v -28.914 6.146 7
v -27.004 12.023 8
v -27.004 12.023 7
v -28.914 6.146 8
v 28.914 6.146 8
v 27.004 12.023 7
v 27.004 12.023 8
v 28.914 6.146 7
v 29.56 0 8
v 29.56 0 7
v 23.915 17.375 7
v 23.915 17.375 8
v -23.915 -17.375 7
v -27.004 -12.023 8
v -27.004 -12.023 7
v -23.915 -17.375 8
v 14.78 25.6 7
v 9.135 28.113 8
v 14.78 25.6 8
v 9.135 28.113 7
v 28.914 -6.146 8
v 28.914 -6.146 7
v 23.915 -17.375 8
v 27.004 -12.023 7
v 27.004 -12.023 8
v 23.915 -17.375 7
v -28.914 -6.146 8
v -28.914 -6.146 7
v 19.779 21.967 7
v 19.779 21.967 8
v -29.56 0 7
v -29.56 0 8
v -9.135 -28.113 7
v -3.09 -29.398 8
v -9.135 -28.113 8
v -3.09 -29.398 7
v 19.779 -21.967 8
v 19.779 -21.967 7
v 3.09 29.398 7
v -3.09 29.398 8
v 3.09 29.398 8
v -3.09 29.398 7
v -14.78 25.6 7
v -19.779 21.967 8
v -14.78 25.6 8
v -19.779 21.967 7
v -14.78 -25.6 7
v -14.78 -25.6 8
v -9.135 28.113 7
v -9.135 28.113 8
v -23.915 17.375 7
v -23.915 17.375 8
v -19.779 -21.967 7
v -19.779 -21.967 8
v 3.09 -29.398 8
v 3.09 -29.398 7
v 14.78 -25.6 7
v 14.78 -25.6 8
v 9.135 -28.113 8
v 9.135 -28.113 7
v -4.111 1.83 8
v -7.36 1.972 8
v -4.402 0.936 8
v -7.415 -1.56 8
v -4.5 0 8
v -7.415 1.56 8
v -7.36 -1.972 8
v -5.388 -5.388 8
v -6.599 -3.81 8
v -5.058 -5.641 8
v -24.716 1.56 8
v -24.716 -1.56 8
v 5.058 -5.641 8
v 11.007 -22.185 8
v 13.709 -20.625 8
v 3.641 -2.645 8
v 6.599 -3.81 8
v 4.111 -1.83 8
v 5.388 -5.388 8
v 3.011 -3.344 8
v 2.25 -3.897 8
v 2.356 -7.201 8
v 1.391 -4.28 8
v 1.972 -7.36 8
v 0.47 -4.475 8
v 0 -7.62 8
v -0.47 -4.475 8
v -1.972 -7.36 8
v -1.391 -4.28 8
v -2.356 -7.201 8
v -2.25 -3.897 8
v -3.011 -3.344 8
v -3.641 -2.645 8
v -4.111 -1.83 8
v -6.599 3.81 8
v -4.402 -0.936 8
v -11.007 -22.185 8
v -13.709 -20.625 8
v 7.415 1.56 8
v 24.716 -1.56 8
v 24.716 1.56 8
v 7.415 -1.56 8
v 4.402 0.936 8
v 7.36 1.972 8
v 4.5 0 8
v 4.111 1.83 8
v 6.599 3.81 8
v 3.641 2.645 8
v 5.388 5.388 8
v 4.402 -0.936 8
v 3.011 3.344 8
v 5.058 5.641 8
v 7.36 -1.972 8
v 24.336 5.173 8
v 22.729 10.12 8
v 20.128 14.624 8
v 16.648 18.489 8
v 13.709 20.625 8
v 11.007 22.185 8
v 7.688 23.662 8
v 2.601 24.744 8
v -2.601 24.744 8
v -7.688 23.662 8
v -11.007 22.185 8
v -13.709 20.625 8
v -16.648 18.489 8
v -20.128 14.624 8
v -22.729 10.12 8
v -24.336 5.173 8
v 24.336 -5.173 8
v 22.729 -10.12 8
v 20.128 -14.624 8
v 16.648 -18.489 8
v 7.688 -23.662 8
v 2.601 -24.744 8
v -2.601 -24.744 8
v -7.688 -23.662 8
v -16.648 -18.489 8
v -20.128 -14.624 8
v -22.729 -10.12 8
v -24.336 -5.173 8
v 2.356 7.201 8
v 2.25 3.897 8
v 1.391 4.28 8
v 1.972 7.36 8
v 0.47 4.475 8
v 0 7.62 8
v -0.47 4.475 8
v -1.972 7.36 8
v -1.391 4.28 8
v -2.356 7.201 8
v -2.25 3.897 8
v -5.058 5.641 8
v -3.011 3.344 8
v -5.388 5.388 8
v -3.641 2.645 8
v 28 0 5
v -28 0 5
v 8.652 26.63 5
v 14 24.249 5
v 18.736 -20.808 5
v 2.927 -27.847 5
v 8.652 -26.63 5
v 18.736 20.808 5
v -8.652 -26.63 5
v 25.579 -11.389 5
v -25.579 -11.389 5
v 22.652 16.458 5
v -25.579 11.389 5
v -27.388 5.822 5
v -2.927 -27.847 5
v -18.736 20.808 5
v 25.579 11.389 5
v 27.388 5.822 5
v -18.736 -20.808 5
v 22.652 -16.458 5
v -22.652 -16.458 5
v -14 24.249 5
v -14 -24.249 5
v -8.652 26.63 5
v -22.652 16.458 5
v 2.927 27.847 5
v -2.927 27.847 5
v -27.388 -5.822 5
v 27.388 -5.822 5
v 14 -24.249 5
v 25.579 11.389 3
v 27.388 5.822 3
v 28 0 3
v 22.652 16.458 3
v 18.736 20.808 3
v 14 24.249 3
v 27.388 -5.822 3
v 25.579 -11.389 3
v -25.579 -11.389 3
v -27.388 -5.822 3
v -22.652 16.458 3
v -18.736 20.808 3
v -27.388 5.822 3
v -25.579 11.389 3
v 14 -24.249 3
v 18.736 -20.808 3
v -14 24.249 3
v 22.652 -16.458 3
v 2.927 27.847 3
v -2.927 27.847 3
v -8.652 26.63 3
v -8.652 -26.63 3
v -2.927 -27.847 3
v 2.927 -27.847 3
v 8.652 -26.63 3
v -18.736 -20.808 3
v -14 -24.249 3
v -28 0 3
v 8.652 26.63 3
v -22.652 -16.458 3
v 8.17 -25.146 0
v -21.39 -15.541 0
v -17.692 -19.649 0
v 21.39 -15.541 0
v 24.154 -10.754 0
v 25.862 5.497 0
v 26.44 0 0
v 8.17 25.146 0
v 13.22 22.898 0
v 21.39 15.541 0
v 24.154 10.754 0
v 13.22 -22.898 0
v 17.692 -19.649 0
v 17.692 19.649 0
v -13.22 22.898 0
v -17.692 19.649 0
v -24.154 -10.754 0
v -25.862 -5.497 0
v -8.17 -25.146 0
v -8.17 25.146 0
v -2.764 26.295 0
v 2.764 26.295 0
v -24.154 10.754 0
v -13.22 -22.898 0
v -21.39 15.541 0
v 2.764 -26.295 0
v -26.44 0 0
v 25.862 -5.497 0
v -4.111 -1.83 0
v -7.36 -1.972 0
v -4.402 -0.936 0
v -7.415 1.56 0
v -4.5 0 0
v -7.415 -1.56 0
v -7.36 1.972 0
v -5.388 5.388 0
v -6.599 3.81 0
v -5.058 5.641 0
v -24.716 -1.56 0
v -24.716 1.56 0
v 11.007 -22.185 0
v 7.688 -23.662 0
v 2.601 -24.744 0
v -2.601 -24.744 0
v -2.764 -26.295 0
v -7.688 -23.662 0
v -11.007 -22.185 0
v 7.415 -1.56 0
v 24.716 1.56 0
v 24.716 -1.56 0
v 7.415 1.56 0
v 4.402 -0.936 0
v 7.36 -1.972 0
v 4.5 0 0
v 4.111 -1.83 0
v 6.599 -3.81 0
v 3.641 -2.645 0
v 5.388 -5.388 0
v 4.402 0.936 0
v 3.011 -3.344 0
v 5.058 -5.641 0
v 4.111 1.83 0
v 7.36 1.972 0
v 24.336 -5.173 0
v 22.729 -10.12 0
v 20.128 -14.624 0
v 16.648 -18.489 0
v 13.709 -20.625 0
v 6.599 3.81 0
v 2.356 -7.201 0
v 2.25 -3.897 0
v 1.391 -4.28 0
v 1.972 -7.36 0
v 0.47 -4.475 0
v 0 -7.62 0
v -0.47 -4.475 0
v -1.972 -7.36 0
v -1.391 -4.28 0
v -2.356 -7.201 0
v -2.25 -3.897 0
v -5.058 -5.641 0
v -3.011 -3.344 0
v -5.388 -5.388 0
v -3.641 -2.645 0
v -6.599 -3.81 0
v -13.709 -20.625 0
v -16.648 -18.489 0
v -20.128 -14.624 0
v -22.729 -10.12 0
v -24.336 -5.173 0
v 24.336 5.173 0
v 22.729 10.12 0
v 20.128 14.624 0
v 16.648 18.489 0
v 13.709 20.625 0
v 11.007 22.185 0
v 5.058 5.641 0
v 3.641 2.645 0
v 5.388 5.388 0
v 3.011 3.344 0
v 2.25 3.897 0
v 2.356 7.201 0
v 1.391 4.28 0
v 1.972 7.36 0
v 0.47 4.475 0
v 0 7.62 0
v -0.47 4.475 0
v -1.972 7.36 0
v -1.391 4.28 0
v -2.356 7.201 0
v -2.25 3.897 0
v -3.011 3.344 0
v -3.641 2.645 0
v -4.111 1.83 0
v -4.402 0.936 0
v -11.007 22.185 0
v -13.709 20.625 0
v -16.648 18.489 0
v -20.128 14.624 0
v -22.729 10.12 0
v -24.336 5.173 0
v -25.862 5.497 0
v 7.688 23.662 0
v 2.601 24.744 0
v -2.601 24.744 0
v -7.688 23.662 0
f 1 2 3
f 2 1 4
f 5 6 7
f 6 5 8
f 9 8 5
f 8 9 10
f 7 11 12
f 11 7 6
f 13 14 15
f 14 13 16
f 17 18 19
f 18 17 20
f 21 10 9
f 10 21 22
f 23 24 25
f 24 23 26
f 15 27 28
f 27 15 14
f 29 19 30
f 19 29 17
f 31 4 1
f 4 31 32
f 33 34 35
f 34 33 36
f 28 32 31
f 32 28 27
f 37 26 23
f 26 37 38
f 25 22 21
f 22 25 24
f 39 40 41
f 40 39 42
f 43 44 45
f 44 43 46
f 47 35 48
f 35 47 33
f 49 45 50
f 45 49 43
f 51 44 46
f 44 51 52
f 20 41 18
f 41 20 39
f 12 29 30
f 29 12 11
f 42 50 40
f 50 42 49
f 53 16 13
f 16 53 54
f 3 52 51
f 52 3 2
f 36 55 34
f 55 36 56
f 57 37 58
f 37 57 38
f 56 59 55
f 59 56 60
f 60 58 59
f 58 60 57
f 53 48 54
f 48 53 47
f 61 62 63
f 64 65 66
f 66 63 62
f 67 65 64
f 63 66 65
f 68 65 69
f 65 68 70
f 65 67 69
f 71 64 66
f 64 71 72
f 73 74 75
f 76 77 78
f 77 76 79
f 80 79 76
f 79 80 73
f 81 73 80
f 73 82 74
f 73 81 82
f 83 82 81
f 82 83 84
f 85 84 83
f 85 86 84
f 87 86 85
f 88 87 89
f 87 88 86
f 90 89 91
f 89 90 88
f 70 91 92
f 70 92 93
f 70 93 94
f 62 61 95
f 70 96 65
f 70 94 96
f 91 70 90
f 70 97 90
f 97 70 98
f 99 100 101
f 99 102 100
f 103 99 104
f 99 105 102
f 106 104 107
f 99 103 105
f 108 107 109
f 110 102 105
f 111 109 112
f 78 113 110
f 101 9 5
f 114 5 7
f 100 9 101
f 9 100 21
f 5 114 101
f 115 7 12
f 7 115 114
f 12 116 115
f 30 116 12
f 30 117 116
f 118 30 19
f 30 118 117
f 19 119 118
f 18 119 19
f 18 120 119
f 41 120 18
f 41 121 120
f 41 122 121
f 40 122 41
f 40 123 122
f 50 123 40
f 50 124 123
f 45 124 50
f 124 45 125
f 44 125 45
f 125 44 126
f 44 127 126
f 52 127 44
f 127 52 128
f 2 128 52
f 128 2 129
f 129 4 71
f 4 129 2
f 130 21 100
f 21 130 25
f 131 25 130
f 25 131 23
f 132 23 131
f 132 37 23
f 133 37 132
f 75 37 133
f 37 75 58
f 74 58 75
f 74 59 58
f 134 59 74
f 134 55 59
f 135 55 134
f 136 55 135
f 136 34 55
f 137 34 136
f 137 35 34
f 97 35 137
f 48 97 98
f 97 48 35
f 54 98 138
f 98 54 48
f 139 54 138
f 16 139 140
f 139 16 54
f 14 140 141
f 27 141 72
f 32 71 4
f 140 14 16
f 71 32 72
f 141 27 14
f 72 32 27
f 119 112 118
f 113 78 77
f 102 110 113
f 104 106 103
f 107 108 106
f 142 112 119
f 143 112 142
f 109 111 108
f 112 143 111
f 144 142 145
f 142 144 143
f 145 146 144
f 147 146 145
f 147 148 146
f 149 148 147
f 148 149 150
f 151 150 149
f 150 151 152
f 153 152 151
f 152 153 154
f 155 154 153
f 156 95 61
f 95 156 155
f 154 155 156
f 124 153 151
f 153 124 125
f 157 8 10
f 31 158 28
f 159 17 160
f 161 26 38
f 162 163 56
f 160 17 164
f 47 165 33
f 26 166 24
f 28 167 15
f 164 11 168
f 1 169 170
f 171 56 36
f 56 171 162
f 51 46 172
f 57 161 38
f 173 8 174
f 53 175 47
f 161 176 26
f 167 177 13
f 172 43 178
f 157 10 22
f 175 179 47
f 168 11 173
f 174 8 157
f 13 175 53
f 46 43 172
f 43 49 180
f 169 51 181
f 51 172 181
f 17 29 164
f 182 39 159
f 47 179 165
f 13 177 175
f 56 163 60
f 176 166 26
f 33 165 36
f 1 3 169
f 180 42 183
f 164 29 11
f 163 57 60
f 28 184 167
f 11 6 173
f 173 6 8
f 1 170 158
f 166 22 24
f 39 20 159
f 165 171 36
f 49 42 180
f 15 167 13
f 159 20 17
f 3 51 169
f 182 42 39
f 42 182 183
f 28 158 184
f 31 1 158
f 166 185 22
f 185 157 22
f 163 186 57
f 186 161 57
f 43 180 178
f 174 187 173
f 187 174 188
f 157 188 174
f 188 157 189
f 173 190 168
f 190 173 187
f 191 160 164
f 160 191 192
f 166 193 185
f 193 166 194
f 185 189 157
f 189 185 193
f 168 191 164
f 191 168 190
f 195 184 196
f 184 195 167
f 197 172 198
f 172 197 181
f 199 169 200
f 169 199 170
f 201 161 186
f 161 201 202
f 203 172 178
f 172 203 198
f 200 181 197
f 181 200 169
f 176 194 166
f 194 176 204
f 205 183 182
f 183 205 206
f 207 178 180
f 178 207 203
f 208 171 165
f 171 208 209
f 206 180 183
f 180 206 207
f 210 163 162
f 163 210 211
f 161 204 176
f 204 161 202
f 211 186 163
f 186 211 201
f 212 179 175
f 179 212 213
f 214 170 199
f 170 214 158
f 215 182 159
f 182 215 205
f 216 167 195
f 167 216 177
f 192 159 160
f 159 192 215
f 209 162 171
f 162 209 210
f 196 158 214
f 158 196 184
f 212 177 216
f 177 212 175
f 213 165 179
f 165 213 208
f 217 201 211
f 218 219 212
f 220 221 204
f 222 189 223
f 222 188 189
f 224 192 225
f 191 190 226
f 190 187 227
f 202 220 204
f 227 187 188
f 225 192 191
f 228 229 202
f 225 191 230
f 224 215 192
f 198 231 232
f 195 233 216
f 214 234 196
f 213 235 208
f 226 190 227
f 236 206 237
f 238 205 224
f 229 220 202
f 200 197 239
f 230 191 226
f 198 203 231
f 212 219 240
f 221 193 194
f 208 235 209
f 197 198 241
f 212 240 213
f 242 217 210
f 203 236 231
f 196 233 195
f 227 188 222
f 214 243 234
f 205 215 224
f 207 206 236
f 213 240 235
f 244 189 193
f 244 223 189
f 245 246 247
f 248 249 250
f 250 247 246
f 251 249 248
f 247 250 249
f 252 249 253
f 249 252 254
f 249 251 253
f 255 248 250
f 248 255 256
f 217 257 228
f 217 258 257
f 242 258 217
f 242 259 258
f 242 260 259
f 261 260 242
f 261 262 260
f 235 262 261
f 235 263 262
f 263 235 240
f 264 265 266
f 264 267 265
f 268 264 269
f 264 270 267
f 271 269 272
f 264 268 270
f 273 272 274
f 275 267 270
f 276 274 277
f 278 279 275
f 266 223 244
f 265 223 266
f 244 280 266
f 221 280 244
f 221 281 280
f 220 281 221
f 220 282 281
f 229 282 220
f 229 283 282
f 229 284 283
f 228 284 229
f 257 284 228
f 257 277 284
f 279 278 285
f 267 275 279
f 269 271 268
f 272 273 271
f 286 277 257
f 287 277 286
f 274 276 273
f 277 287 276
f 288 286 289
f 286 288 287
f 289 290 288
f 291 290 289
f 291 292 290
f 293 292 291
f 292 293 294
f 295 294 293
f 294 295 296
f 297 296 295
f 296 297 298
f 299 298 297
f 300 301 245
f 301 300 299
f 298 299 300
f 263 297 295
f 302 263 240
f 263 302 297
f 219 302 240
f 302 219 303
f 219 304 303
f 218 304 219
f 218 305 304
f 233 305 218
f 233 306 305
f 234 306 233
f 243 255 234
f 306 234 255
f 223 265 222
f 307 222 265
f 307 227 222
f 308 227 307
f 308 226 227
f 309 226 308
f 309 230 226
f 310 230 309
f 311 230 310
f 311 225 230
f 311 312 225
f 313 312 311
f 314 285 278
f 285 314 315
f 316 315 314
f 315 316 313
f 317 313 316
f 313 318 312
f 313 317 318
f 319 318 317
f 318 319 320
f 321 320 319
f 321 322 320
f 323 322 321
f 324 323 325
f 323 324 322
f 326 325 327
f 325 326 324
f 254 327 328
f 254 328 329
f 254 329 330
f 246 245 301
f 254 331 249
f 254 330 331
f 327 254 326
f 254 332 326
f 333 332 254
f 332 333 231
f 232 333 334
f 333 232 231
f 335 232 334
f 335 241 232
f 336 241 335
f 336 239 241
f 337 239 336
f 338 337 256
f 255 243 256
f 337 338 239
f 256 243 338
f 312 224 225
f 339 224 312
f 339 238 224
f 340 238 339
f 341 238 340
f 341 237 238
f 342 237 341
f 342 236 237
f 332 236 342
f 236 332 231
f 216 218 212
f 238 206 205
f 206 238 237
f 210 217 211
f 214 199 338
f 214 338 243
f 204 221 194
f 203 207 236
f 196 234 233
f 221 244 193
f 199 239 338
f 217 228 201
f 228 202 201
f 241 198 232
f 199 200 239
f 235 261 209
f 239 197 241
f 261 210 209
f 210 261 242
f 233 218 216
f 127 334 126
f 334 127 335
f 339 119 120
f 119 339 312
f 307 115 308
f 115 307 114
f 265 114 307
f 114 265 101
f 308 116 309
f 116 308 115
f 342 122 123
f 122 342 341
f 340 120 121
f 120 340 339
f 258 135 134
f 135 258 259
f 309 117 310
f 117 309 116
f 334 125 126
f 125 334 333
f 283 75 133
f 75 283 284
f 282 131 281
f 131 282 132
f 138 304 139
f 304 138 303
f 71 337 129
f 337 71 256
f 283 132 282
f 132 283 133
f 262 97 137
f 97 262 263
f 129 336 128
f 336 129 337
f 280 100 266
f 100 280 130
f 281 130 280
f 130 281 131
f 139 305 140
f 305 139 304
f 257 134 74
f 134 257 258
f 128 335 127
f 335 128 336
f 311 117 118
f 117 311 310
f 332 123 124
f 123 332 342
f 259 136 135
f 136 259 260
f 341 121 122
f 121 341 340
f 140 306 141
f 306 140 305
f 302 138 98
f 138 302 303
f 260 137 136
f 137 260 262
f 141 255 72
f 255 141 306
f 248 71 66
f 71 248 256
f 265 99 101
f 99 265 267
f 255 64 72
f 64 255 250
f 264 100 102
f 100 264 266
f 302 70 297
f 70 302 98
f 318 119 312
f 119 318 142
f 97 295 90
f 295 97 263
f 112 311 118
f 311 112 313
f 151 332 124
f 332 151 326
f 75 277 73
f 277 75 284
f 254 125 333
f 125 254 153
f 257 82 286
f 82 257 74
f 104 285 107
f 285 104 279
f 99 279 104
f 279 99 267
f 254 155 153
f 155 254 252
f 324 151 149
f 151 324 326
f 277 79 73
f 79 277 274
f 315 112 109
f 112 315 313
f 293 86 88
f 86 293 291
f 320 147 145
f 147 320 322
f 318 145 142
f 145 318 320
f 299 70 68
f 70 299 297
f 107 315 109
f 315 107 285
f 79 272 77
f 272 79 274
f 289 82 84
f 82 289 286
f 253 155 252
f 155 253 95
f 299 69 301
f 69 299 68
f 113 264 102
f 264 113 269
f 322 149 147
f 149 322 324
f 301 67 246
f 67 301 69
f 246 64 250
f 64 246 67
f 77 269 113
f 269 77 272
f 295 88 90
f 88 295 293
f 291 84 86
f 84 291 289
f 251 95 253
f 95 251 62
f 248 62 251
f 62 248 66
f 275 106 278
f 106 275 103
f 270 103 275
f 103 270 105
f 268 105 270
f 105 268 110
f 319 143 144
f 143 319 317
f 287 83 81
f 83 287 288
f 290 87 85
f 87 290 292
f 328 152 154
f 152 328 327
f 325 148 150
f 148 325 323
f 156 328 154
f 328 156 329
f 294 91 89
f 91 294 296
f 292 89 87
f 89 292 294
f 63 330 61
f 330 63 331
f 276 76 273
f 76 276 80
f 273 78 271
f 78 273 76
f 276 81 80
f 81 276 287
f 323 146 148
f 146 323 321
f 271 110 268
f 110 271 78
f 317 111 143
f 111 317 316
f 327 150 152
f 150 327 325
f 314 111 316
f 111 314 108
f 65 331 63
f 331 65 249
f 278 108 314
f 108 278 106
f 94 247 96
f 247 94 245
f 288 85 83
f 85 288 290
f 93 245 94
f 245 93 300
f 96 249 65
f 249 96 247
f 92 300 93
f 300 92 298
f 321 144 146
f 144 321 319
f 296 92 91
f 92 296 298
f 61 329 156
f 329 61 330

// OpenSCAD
// PLASTIBOT MENDEL
// Spool Bushing
// Added settings for 1Kg Ultimachine spool.
// Plastibot <support@plastibot.com>
// Derived from: 

// Parametric Bushing
// by Generic
// http://www.thingiverse.com/thing:8697




module bushing(height, radius, hole_r, border,recess,num_support) {
	translate([0,0,height])
	mirror([0,0,1])
	difference() {
		union() {
			// Outer rings
			difference() {
				union() {
					cylinder(r=radius+border,h=1);
					translate([0,0,1]) {
						cylinder(h=2,r1=radius+border,r2=radius);
					}
					translate([0,0,3]) {
						cylinder(r=radius,h=height-6);
					}
					translate([0,0,height-3]) {
						cylinder(h=3,r1=radius,r2=radius-border);
					}
				}
				translate([0,0,-1]) {
					cylinder(r=radius-(border*2),h=height+border);
				}
			}
			// shafts
			for ( i=[0:num_support-1]) {
				rotate(a=[0,0,i*180/num_support]) {
					translate([-radius+border+0.4,-border,0]) {
						cube(size=[(radius-border)*2-0.6,border*2,height]);
					}
				}
			}
			// Central ring
			cylinder(r=hole_r+border*2,h=height);
		}
		translate([0,0,-1]) {
			// Central hole
			cylinder(r=hole_r,h=height+2,$fs=0.1);
			// Recess
			cylinder(r=radius-2*border, h=recess);
		}
	}
}


// Bushing BfB
//bushing(16, 75/2, 4.5, 1.56,5,3);

// Bushing orbitech
//bushing(16, 26.2, 4.5, 1.56,0,3);

// Bushing 51mm (ultimachine 1Kg)
bushing(8, 28, 4.5, 1.56,0,3);
